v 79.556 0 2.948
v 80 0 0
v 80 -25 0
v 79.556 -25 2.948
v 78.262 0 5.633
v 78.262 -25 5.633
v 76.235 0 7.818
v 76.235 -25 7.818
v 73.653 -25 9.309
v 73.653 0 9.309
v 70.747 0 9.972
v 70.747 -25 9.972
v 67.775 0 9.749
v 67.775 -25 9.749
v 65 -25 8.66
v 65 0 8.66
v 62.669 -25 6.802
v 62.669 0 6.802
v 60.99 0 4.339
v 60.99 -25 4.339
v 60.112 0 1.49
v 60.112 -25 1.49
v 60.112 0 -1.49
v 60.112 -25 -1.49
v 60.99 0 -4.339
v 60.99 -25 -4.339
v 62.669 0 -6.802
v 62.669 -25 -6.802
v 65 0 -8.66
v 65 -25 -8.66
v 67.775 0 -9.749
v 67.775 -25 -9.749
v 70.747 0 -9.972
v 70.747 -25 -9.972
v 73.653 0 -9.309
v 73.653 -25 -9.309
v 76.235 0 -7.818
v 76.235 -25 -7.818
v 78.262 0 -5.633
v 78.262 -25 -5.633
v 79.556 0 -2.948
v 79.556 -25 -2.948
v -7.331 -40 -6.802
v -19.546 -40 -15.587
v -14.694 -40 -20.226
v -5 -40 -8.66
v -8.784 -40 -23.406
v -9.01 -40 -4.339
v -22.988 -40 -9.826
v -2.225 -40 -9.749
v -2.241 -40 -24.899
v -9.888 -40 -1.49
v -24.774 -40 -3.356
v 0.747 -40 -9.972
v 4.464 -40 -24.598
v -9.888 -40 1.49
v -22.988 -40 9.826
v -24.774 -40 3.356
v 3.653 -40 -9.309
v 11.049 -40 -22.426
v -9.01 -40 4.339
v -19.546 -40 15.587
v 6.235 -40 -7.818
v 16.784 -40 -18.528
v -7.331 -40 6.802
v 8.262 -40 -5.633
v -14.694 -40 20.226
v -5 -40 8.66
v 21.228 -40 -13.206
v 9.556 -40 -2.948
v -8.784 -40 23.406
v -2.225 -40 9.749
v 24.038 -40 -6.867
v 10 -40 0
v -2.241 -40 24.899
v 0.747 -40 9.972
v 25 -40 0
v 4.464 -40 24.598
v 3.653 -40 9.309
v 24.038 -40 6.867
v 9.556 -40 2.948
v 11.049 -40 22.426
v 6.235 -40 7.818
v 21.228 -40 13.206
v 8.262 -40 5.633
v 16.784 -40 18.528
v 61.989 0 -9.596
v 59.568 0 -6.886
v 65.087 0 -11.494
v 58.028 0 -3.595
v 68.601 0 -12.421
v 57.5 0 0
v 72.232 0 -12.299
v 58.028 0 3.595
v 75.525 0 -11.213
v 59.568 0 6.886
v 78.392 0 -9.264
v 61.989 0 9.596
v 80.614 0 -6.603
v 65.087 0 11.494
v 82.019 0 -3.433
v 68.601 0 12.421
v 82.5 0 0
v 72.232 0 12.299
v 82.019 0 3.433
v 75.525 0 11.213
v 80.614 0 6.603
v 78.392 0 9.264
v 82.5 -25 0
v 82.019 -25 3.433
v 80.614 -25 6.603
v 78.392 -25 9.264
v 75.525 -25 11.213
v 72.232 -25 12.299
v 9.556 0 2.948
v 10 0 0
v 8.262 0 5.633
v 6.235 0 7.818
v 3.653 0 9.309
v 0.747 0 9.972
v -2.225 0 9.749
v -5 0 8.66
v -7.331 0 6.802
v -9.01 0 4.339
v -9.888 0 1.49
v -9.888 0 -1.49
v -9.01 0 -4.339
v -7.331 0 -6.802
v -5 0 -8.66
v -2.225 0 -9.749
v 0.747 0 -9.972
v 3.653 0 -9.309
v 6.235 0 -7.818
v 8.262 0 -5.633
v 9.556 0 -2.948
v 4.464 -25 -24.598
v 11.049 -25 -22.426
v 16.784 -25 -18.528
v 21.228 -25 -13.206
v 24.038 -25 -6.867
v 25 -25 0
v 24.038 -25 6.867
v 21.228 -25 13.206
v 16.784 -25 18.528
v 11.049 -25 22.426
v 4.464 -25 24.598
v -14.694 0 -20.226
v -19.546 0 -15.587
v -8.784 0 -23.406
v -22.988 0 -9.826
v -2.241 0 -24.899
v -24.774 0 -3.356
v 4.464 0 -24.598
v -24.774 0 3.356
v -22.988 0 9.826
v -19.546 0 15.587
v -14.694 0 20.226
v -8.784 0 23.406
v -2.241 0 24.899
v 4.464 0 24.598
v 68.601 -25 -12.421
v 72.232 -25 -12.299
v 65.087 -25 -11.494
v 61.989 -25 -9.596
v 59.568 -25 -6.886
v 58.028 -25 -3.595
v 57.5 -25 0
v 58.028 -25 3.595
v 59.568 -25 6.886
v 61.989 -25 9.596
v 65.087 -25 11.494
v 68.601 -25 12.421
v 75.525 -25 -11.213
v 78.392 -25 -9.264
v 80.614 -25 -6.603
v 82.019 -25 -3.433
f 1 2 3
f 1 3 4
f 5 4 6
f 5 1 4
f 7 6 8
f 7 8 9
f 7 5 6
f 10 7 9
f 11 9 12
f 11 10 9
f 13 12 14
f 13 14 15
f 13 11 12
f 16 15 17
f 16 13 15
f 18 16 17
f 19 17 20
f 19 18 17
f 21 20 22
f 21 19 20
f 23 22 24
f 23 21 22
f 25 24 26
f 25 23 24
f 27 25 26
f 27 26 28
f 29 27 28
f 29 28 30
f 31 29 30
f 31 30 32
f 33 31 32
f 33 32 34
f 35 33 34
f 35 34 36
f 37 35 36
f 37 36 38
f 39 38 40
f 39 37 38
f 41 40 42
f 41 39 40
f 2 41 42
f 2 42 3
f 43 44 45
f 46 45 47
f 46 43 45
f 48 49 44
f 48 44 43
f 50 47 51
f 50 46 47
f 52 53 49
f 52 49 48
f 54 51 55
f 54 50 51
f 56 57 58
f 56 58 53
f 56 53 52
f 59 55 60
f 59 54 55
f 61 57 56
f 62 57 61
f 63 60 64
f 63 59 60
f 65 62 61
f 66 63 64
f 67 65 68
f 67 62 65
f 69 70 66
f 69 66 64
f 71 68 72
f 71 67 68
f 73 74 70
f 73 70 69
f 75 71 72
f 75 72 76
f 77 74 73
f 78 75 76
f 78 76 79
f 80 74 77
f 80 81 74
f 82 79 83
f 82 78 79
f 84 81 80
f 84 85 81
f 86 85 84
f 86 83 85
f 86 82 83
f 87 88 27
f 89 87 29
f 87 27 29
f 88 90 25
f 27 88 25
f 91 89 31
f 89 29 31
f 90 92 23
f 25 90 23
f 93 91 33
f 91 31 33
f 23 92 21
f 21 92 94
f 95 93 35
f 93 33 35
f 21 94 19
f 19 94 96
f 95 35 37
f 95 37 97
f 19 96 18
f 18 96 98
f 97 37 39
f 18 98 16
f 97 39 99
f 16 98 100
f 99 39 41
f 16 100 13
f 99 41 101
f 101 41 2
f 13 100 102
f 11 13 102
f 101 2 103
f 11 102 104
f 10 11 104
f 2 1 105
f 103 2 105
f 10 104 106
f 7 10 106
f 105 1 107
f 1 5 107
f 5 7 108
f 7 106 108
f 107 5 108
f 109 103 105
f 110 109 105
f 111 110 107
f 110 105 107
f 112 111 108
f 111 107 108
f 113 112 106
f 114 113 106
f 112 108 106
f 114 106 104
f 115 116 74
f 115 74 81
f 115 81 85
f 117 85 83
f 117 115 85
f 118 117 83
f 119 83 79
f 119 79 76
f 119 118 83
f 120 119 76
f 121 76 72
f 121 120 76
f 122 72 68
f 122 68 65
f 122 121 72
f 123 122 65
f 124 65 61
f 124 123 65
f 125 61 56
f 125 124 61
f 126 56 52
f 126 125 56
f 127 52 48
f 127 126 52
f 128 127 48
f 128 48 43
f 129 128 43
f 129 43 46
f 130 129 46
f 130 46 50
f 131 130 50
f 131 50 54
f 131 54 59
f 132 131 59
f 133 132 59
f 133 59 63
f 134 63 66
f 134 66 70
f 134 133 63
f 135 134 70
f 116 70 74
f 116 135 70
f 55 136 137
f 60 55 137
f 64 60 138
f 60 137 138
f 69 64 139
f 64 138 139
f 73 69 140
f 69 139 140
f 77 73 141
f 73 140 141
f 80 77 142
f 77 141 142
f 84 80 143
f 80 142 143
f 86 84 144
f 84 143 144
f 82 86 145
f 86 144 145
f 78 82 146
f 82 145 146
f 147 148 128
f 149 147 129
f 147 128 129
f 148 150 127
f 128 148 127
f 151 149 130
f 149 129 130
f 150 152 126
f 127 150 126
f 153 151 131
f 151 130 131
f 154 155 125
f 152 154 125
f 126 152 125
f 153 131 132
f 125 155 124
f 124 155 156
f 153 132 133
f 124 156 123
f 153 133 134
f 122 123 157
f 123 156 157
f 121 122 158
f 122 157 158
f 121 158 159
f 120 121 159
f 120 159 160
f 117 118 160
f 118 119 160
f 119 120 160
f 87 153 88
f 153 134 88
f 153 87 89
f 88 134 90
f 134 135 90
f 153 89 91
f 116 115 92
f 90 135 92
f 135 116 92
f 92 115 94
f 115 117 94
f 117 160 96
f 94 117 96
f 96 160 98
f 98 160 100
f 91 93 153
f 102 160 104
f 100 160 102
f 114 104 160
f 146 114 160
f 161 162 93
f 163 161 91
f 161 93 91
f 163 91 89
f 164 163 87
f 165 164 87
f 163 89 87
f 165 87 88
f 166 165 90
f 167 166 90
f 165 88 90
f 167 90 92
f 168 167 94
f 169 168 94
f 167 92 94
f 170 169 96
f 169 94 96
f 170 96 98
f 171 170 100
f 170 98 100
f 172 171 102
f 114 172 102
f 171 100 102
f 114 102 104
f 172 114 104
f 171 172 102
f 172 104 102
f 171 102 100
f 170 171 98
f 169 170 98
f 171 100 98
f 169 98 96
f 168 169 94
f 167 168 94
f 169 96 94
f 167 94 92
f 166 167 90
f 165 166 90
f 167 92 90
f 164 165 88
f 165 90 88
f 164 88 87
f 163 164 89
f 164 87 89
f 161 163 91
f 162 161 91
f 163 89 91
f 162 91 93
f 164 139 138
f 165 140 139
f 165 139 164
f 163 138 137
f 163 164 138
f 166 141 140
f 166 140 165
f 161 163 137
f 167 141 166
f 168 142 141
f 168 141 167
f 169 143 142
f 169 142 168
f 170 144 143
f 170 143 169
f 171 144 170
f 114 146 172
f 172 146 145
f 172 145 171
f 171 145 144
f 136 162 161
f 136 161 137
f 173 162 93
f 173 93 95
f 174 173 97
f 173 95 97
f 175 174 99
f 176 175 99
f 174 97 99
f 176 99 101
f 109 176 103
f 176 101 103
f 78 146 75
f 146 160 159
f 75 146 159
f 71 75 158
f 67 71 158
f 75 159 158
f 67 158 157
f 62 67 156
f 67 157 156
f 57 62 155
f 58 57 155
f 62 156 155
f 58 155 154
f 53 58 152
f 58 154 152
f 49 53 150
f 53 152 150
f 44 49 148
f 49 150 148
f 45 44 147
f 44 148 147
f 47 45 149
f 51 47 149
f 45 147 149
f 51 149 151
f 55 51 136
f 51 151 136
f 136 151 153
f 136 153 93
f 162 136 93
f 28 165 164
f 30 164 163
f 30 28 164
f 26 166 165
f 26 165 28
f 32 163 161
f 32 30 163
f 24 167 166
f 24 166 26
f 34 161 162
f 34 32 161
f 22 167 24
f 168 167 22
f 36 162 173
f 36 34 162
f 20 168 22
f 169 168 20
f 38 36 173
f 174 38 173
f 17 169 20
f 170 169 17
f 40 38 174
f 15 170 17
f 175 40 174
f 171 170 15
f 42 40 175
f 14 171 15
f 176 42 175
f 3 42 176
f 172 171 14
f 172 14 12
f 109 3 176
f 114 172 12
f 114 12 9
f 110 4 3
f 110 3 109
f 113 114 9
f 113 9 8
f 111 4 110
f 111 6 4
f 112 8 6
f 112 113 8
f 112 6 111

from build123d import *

# Parameters (mm, degrees)
F0_R     = 10
F2_DEPTH = 25
F3_DEPTH = 40


with BuildPart() as f2:
    # F0 (on Front) → F2 (new body)
    with BuildSketch(Plane.XZ):
        with BuildLine():
            ThreePointArc((82.5, 0), (79.5956184197, 8.0108743058), (72.2321428571, 12.2990868875))
            ThreePointArc((72.2321428571, 12.2990868875), (57.5, 0), (72.2321428571, -12.2990868875))
            ThreePointArc((72.2321428571, -12.2990868875), (79.5956184197, -8.0108743058), (82.5, 0))
        make_face()
        with Locations((70, 0)):
            Circle(F0_R, mode=Mode.SUBTRACT)
    extrude(amount=F2_DEPTH)


with BuildPart() as f2b:
    # F1 (on face) → F2, piece 2 (new body)
    with BuildSketch(Plane.XZ):
        with BuildLine():
            Line((72.2321428571, 12.2990868875), (4.4642857143, 24.5981737749))
            ThreePointArc((4.4642857143, 24.5981737749), (19.1912368395, 16.0217486115), (25, 0))
            ThreePointArc((25, 0), (19.1912368395, -16.0217486115), (4.4642857143, -24.5981737749))
            Line((4.4642857143, -24.5981737749), (72.2321428571, -12.2990868875))
            ThreePointArc((72.2321428571, -12.2990868875), (57.5, 0), (72.2321428571, 12.2990868875))
        make_face()
    extrude(amount=F2_DEPTH)

    # F0 (on Front) → F3 (join)
    with BuildSketch(Plane.XZ):
        with BuildLine():
            ThreePointArc((4.4642857143, -24.5981737749), (19.1912368395, -16.0217486115), (25, 0))
            ThreePointArc((25, 0), (19.1912368395, 16.0217486115), (4.4642857143, 24.5981737749))
            ThreePointArc((4.4642857143, 24.5981737749), (-25, 0), (4.4642857143, -24.5981737749))
        make_face()
        Circle(F0_R, mode=Mode.SUBTRACT)
    extrude(amount=F3_DEPTH)


solid = Compound([f2.part, f2b.part])
